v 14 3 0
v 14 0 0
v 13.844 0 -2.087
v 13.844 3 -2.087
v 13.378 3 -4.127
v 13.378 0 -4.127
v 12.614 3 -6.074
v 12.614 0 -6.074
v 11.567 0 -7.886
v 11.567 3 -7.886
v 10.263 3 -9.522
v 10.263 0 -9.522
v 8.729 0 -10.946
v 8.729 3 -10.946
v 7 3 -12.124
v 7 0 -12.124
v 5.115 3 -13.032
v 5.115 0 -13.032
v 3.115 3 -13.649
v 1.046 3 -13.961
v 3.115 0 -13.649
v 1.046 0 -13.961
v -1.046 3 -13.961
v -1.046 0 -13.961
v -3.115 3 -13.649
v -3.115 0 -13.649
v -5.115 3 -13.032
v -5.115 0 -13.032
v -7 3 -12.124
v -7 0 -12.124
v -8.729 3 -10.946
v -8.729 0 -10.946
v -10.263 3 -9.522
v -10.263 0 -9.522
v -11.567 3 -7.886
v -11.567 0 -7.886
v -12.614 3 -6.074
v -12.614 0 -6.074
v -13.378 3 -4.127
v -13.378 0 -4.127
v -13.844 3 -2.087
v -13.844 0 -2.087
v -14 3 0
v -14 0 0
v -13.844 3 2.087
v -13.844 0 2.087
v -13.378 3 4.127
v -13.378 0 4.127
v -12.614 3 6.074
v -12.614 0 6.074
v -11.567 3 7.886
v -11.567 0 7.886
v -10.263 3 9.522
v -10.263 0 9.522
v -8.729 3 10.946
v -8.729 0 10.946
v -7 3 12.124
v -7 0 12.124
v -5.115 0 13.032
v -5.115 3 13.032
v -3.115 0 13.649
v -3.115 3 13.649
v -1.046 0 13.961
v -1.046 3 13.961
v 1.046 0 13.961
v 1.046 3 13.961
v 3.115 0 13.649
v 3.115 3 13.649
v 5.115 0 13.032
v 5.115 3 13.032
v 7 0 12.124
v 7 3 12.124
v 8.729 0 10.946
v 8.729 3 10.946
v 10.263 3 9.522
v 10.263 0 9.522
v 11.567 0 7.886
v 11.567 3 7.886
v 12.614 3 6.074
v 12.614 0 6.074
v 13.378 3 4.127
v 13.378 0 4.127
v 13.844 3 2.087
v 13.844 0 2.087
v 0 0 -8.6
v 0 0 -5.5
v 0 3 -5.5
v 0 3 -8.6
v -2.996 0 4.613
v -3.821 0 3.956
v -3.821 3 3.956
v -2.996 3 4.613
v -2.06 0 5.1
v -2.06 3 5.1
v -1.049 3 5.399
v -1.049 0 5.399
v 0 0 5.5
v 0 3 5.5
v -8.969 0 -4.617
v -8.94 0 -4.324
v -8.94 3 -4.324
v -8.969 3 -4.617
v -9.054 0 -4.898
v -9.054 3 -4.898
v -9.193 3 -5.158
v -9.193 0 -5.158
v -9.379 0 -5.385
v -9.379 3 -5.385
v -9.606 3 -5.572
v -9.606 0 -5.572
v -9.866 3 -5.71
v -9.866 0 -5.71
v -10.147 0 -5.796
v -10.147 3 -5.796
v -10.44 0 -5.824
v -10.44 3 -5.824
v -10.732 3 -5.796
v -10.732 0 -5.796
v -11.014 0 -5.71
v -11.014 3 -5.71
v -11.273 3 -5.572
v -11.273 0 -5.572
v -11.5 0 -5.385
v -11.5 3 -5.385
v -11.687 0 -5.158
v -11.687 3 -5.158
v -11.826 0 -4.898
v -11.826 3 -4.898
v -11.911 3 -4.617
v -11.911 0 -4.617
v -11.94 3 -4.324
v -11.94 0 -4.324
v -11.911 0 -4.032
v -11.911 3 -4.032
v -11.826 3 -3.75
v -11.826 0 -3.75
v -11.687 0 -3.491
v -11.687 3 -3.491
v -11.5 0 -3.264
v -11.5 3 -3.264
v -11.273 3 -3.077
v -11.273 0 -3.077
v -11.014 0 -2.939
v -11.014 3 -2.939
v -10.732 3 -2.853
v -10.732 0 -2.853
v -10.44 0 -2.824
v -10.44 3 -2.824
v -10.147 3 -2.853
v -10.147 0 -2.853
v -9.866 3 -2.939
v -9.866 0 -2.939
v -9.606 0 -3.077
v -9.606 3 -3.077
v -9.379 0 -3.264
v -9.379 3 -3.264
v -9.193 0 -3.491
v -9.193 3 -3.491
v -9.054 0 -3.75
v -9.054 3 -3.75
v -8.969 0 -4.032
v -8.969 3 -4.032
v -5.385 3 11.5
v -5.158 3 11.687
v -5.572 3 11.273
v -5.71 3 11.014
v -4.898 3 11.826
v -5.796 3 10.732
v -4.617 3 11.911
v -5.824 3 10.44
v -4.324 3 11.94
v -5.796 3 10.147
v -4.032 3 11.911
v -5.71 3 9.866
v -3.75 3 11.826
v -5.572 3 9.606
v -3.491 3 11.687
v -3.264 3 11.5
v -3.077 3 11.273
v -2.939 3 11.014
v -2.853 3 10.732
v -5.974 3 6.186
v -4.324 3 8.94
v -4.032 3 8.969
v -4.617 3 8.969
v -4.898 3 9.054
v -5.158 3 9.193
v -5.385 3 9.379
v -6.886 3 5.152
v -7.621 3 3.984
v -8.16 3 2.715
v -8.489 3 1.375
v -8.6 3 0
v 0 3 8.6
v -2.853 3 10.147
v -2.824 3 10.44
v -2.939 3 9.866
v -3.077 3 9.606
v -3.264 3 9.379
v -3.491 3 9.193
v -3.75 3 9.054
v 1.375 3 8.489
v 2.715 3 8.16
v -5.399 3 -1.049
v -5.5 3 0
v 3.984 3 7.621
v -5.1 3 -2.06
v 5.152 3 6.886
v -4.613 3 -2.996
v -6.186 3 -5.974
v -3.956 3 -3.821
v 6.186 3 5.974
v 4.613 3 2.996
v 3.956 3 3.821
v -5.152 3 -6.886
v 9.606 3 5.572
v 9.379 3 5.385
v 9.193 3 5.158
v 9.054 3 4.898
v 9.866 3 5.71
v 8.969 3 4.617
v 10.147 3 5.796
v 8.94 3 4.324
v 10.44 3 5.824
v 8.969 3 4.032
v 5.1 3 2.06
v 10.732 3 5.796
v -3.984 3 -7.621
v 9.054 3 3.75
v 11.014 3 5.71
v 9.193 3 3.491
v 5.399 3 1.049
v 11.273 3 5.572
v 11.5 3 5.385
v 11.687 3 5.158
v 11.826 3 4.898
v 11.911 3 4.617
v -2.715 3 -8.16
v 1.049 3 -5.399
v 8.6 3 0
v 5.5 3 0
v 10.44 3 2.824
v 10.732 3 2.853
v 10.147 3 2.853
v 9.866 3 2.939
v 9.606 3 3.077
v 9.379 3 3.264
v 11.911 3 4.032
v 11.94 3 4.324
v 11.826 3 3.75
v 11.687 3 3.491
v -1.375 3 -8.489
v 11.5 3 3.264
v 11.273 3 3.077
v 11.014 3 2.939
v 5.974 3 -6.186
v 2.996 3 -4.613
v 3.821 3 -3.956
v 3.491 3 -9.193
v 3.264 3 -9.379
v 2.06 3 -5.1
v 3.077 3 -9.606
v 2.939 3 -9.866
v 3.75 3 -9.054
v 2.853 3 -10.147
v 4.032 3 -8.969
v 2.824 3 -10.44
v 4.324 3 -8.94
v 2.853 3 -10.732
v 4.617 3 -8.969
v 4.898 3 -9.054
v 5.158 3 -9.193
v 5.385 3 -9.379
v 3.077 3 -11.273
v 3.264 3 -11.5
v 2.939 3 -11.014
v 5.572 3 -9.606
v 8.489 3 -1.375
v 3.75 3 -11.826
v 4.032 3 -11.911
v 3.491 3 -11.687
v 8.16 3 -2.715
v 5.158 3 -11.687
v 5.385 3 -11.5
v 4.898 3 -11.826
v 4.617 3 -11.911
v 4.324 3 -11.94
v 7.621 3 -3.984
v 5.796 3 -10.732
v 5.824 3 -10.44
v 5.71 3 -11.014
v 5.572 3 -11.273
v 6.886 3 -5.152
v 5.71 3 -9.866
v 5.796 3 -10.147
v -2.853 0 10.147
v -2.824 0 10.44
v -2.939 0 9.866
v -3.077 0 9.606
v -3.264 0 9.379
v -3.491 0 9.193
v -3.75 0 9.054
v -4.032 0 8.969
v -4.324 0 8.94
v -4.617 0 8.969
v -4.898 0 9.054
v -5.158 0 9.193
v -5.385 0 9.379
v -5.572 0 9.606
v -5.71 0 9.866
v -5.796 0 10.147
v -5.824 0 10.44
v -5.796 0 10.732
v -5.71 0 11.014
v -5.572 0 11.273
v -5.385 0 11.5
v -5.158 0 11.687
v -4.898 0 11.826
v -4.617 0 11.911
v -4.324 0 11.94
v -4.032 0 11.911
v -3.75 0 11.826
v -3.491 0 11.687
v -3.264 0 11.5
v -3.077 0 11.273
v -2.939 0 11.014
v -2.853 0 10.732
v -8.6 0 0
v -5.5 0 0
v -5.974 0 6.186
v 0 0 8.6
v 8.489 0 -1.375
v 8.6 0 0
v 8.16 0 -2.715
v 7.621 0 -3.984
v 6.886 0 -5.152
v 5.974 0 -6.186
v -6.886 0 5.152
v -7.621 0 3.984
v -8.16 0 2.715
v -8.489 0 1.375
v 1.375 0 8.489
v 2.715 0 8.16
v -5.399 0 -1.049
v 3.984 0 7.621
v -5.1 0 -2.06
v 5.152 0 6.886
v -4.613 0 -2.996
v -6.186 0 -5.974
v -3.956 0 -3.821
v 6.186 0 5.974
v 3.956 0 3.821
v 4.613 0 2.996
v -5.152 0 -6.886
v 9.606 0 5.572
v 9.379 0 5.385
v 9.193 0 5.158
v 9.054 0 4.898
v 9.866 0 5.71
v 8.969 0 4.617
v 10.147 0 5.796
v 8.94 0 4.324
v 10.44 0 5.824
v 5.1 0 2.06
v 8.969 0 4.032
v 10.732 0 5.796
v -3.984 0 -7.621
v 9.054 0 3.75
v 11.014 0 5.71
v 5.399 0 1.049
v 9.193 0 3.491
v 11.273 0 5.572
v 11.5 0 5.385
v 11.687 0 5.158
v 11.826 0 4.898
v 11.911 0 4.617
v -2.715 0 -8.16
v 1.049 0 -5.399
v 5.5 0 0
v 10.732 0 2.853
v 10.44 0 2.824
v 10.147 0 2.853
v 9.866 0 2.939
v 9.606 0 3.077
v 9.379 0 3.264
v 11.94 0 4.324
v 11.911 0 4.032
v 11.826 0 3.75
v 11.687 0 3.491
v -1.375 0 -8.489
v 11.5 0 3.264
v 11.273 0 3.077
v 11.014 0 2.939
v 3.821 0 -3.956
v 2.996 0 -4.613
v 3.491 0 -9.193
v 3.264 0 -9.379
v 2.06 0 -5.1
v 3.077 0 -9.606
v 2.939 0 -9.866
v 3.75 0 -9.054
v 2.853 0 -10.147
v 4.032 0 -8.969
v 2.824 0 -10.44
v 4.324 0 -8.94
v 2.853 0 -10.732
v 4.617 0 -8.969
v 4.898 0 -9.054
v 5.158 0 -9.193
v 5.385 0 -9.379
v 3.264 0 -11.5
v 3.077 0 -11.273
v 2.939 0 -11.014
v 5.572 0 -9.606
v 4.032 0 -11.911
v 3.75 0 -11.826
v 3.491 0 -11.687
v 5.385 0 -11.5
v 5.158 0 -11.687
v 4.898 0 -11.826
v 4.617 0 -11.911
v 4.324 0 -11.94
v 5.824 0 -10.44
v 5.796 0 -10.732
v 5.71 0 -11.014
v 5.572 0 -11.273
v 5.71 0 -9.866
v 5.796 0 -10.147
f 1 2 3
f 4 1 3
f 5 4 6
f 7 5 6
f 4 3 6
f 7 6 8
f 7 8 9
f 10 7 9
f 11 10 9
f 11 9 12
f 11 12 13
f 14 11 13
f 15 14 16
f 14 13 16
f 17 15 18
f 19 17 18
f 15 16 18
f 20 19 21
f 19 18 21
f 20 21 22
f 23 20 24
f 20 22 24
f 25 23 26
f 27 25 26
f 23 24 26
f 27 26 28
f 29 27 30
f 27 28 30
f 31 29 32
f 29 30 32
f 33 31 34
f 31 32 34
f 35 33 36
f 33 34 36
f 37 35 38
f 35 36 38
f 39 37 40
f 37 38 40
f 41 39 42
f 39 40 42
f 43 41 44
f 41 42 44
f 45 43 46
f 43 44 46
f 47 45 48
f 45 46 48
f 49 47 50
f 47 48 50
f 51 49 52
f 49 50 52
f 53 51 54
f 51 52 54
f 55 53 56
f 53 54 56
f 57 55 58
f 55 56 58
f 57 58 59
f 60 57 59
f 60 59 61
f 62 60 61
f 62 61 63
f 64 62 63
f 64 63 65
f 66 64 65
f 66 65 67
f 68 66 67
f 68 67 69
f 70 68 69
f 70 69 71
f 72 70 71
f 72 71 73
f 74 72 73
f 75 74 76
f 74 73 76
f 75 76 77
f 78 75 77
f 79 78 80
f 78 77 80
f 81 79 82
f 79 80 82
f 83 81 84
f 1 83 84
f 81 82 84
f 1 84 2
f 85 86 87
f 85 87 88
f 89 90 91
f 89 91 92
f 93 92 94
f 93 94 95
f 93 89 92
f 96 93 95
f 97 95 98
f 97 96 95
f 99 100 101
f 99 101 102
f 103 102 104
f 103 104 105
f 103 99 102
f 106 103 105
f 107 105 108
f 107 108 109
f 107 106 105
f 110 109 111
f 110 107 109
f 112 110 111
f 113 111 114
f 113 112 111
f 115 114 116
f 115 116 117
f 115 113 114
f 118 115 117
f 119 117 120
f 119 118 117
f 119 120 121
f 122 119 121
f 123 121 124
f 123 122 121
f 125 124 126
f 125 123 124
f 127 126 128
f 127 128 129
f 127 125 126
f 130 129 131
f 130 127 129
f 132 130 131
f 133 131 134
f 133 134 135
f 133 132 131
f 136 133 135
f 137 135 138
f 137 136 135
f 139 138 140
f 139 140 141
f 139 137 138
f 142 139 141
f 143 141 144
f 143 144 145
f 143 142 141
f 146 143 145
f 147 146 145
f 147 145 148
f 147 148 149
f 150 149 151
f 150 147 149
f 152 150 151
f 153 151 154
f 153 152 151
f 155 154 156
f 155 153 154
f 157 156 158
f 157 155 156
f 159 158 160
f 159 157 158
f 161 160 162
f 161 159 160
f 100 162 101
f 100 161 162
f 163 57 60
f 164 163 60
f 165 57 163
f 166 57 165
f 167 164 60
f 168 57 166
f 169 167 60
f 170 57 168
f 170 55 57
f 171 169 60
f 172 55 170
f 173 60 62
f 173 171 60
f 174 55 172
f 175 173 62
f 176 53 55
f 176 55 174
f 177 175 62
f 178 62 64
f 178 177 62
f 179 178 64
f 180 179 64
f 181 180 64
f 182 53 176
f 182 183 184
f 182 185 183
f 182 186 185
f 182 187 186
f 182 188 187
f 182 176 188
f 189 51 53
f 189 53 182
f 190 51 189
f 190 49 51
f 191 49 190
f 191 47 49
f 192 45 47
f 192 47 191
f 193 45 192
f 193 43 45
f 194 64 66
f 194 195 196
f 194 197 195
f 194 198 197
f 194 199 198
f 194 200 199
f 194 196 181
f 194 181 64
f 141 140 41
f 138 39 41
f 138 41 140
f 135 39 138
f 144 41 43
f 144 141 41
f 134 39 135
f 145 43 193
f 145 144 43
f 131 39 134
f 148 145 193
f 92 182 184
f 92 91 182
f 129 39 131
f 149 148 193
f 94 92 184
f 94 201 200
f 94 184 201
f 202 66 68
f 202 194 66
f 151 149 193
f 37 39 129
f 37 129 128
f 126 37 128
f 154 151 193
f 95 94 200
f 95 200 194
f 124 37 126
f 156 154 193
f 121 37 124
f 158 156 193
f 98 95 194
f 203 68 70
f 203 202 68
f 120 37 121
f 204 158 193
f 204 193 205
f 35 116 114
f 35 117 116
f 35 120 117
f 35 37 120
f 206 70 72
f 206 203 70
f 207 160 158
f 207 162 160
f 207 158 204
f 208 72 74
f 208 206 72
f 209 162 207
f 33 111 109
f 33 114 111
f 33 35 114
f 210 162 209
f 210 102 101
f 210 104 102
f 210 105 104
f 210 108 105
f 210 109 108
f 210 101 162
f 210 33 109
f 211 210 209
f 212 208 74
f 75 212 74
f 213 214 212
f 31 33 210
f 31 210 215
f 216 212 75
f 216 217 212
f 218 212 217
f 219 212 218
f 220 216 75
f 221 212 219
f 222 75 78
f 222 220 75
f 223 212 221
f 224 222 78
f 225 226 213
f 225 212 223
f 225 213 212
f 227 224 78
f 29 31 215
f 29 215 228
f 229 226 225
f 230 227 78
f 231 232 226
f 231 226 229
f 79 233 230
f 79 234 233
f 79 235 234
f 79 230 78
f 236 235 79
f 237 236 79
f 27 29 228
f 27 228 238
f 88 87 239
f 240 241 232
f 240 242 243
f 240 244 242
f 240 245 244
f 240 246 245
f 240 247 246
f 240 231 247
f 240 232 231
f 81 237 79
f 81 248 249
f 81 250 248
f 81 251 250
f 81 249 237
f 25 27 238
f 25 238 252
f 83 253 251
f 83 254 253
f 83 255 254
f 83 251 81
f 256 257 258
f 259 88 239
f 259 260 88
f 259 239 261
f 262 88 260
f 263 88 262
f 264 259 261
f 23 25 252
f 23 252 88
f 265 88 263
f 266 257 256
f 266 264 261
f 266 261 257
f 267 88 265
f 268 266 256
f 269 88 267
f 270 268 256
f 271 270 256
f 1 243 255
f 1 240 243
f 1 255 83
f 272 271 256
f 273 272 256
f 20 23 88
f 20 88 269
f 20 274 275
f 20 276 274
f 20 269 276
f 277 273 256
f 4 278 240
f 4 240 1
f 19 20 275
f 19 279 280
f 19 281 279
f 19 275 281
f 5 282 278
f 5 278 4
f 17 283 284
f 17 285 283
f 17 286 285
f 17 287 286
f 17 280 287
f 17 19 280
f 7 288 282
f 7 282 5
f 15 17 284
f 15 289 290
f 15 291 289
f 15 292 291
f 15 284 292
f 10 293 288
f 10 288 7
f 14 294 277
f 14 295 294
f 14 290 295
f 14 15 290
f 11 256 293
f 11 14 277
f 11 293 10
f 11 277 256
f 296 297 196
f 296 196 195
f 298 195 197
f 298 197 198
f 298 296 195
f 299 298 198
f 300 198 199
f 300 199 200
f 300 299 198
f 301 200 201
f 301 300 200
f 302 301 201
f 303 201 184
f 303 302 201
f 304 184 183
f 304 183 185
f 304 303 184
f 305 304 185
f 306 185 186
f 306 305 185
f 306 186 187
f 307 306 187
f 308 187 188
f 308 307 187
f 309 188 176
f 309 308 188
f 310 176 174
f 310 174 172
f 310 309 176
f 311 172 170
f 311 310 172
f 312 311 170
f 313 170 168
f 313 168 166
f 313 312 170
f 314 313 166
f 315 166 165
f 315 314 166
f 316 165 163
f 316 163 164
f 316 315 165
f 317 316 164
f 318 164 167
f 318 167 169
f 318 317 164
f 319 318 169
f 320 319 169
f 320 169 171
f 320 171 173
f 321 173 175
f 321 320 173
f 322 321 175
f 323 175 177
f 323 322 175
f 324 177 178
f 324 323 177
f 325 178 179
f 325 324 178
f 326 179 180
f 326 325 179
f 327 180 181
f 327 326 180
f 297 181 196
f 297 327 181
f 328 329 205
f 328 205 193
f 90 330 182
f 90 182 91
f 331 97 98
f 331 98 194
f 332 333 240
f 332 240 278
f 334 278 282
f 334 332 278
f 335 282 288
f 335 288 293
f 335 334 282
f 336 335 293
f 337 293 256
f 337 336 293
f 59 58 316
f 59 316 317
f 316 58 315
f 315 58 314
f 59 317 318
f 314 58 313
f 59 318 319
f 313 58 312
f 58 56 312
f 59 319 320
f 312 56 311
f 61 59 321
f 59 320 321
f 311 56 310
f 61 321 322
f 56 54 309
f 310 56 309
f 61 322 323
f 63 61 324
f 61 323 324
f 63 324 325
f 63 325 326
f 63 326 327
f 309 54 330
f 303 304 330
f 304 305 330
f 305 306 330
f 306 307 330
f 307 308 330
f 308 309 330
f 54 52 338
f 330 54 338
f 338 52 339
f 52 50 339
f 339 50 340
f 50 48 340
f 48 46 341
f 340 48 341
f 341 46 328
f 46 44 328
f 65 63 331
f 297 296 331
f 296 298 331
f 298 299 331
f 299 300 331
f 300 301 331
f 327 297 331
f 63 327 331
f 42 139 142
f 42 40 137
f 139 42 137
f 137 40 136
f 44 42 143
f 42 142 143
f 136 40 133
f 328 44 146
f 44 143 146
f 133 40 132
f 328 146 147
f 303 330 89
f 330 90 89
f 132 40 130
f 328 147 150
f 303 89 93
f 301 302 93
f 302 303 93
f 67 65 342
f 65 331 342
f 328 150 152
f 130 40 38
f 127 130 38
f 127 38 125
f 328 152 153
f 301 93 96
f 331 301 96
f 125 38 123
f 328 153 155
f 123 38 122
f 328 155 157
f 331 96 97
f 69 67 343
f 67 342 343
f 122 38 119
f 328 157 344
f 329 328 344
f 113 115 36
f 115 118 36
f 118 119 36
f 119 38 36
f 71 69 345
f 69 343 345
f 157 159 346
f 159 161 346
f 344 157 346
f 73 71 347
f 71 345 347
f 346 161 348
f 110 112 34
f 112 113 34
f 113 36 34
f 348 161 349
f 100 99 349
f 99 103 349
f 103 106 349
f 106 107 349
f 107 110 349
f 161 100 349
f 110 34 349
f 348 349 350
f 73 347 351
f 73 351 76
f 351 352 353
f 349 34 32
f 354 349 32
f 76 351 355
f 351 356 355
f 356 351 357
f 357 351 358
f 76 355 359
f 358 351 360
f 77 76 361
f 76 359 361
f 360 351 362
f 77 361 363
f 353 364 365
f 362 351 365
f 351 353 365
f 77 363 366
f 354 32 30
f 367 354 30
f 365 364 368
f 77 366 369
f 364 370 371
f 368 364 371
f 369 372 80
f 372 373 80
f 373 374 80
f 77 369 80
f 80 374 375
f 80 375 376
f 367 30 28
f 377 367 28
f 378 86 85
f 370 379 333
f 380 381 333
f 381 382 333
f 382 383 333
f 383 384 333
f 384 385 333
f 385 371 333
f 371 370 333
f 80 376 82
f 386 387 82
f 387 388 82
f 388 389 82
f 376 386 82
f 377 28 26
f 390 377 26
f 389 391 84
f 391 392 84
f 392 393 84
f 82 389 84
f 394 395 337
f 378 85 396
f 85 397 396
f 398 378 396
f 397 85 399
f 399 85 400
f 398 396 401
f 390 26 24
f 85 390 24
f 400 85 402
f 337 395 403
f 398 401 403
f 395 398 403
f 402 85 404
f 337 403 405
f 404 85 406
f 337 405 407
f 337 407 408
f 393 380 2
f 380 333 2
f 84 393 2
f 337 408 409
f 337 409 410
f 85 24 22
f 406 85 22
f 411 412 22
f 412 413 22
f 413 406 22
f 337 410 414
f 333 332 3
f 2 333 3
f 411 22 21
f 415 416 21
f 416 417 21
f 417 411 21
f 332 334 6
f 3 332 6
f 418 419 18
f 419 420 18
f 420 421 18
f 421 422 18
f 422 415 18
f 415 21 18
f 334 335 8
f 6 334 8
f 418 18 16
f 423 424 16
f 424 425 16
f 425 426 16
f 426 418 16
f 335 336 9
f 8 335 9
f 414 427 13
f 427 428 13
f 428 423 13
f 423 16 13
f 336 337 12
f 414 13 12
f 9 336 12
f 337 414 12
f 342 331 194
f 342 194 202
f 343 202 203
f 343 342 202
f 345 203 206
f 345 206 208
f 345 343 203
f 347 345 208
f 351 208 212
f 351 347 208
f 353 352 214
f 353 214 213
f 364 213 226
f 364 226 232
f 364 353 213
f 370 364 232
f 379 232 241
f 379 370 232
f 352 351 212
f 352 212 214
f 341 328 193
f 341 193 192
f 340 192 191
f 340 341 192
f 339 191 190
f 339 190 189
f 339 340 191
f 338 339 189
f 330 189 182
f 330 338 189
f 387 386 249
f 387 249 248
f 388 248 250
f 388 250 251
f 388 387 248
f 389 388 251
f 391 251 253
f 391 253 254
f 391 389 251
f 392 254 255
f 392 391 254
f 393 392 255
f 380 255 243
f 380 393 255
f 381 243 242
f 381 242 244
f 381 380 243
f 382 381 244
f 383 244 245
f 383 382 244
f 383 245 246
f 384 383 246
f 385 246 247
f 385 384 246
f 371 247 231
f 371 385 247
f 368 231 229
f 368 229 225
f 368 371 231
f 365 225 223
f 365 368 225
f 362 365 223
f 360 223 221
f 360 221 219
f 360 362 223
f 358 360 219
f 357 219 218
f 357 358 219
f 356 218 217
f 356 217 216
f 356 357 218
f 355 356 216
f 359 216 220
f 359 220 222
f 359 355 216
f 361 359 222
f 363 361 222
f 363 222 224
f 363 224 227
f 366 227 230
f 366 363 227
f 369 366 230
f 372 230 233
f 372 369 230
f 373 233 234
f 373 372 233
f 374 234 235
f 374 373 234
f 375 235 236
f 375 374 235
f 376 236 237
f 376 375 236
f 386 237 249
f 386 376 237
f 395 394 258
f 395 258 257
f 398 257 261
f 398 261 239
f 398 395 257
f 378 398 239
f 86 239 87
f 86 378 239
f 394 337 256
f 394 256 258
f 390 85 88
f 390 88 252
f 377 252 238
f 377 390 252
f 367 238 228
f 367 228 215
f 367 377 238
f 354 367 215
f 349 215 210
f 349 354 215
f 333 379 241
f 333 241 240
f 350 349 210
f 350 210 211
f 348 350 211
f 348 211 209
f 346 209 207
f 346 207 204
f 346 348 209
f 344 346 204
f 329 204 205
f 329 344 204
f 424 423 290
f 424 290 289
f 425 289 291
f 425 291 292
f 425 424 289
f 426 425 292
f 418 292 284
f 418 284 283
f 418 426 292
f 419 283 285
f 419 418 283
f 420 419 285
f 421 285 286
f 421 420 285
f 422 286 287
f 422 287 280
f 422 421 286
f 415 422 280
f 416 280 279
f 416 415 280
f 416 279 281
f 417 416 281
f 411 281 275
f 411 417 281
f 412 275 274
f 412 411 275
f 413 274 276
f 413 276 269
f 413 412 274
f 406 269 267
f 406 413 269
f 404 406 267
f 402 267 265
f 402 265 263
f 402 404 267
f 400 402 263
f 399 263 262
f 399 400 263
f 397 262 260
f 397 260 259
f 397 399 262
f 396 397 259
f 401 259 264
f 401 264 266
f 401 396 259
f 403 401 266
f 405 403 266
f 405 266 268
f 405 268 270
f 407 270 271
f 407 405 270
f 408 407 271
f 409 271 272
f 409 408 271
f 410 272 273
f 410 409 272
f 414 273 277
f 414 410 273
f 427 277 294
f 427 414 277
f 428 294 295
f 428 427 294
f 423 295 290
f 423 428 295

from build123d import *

# Parameters (mm, degrees)
SKETCH1_R           = 14
SKETCH1_R_2         = 1.5
BOSS_EXTRUDE1_DEPTH = 3


with BuildPart() as part:
    # Sketch1 → Boss-Extrude1 (new body)
    with BuildSketch(Plane(origin=(0, 0, 0), x_dir=(1, 0, 0), z_dir=(0, 1, 0))):
        Circle(SKETCH1_R)
        with Locations((-4.324322786, -10.439838717)):
            Circle(SKETCH1_R_2, mode=Mode.SUBTRACT)
        with Locations((10.439838717, -4.324322786)):
            Circle(SKETCH1_R_2, mode=Mode.SUBTRACT)
        with Locations((4.324322786, 10.439838717)):
            Circle(SKETCH1_R_2, mode=Mode.SUBTRACT)
        with Locations((-10.439838717, 4.324322786)):
            Circle(SKETCH1_R_2, mode=Mode.SUBTRACT)
        with BuildLine():
            ThreePointArc((-3.820621038, -3.956368902), (-2.060336264, -5.0995112), (0, -5.5))
            Line((0, -5.5), (0, -8.6))
            ThreePointArc((0, -8.6), (3.360287705, -7.91634174), (6.186322283, -5.974061986))
            Line((6.186322283, -5.974061986), (3.956368902, -3.820621038))
            ThreePointArc((3.956368902, -3.820621038), (5.0995112, -2.060336264), (5.5, 0))
            Line((5.5, 0), (8.6, 0))
            ThreePointArc((8.6, 0), (7.91634174, 3.360287705), (5.974061986, 6.186322283))
            Line((5.974061986, 6.186322283), (3.820621038, 3.956368902))
            ThreePointArc((3.820621038, 3.956368902), (2.060336264, 5.0995112), (0, 5.5))
            Line((0, 5.5), (0, 8.6))
            ThreePointArc((0, 8.6), (-3.360287705, 7.91634174), (-6.186322283, 5.974061986))
            Line((-6.186322283, 5.974061986), (-3.956368902, 3.820621038))
            ThreePointArc((-3.956368902, 3.820621038), (-5.0995112, 2.060336264), (-5.5, 0))
            Line((-5.5, 0), (-8.6, 0))
            ThreePointArc((-8.6, 0), (-7.91634174, -3.360287705), (-5.974061986, -6.186322283))
            Line((-5.974061986, -6.186322283), (-3.820621038, -3.956368902))
        make_face(mode=Mode.SUBTRACT)
    extrude(amount=BOSS_EXTRUDE1_DEPTH)


solid = part.part
